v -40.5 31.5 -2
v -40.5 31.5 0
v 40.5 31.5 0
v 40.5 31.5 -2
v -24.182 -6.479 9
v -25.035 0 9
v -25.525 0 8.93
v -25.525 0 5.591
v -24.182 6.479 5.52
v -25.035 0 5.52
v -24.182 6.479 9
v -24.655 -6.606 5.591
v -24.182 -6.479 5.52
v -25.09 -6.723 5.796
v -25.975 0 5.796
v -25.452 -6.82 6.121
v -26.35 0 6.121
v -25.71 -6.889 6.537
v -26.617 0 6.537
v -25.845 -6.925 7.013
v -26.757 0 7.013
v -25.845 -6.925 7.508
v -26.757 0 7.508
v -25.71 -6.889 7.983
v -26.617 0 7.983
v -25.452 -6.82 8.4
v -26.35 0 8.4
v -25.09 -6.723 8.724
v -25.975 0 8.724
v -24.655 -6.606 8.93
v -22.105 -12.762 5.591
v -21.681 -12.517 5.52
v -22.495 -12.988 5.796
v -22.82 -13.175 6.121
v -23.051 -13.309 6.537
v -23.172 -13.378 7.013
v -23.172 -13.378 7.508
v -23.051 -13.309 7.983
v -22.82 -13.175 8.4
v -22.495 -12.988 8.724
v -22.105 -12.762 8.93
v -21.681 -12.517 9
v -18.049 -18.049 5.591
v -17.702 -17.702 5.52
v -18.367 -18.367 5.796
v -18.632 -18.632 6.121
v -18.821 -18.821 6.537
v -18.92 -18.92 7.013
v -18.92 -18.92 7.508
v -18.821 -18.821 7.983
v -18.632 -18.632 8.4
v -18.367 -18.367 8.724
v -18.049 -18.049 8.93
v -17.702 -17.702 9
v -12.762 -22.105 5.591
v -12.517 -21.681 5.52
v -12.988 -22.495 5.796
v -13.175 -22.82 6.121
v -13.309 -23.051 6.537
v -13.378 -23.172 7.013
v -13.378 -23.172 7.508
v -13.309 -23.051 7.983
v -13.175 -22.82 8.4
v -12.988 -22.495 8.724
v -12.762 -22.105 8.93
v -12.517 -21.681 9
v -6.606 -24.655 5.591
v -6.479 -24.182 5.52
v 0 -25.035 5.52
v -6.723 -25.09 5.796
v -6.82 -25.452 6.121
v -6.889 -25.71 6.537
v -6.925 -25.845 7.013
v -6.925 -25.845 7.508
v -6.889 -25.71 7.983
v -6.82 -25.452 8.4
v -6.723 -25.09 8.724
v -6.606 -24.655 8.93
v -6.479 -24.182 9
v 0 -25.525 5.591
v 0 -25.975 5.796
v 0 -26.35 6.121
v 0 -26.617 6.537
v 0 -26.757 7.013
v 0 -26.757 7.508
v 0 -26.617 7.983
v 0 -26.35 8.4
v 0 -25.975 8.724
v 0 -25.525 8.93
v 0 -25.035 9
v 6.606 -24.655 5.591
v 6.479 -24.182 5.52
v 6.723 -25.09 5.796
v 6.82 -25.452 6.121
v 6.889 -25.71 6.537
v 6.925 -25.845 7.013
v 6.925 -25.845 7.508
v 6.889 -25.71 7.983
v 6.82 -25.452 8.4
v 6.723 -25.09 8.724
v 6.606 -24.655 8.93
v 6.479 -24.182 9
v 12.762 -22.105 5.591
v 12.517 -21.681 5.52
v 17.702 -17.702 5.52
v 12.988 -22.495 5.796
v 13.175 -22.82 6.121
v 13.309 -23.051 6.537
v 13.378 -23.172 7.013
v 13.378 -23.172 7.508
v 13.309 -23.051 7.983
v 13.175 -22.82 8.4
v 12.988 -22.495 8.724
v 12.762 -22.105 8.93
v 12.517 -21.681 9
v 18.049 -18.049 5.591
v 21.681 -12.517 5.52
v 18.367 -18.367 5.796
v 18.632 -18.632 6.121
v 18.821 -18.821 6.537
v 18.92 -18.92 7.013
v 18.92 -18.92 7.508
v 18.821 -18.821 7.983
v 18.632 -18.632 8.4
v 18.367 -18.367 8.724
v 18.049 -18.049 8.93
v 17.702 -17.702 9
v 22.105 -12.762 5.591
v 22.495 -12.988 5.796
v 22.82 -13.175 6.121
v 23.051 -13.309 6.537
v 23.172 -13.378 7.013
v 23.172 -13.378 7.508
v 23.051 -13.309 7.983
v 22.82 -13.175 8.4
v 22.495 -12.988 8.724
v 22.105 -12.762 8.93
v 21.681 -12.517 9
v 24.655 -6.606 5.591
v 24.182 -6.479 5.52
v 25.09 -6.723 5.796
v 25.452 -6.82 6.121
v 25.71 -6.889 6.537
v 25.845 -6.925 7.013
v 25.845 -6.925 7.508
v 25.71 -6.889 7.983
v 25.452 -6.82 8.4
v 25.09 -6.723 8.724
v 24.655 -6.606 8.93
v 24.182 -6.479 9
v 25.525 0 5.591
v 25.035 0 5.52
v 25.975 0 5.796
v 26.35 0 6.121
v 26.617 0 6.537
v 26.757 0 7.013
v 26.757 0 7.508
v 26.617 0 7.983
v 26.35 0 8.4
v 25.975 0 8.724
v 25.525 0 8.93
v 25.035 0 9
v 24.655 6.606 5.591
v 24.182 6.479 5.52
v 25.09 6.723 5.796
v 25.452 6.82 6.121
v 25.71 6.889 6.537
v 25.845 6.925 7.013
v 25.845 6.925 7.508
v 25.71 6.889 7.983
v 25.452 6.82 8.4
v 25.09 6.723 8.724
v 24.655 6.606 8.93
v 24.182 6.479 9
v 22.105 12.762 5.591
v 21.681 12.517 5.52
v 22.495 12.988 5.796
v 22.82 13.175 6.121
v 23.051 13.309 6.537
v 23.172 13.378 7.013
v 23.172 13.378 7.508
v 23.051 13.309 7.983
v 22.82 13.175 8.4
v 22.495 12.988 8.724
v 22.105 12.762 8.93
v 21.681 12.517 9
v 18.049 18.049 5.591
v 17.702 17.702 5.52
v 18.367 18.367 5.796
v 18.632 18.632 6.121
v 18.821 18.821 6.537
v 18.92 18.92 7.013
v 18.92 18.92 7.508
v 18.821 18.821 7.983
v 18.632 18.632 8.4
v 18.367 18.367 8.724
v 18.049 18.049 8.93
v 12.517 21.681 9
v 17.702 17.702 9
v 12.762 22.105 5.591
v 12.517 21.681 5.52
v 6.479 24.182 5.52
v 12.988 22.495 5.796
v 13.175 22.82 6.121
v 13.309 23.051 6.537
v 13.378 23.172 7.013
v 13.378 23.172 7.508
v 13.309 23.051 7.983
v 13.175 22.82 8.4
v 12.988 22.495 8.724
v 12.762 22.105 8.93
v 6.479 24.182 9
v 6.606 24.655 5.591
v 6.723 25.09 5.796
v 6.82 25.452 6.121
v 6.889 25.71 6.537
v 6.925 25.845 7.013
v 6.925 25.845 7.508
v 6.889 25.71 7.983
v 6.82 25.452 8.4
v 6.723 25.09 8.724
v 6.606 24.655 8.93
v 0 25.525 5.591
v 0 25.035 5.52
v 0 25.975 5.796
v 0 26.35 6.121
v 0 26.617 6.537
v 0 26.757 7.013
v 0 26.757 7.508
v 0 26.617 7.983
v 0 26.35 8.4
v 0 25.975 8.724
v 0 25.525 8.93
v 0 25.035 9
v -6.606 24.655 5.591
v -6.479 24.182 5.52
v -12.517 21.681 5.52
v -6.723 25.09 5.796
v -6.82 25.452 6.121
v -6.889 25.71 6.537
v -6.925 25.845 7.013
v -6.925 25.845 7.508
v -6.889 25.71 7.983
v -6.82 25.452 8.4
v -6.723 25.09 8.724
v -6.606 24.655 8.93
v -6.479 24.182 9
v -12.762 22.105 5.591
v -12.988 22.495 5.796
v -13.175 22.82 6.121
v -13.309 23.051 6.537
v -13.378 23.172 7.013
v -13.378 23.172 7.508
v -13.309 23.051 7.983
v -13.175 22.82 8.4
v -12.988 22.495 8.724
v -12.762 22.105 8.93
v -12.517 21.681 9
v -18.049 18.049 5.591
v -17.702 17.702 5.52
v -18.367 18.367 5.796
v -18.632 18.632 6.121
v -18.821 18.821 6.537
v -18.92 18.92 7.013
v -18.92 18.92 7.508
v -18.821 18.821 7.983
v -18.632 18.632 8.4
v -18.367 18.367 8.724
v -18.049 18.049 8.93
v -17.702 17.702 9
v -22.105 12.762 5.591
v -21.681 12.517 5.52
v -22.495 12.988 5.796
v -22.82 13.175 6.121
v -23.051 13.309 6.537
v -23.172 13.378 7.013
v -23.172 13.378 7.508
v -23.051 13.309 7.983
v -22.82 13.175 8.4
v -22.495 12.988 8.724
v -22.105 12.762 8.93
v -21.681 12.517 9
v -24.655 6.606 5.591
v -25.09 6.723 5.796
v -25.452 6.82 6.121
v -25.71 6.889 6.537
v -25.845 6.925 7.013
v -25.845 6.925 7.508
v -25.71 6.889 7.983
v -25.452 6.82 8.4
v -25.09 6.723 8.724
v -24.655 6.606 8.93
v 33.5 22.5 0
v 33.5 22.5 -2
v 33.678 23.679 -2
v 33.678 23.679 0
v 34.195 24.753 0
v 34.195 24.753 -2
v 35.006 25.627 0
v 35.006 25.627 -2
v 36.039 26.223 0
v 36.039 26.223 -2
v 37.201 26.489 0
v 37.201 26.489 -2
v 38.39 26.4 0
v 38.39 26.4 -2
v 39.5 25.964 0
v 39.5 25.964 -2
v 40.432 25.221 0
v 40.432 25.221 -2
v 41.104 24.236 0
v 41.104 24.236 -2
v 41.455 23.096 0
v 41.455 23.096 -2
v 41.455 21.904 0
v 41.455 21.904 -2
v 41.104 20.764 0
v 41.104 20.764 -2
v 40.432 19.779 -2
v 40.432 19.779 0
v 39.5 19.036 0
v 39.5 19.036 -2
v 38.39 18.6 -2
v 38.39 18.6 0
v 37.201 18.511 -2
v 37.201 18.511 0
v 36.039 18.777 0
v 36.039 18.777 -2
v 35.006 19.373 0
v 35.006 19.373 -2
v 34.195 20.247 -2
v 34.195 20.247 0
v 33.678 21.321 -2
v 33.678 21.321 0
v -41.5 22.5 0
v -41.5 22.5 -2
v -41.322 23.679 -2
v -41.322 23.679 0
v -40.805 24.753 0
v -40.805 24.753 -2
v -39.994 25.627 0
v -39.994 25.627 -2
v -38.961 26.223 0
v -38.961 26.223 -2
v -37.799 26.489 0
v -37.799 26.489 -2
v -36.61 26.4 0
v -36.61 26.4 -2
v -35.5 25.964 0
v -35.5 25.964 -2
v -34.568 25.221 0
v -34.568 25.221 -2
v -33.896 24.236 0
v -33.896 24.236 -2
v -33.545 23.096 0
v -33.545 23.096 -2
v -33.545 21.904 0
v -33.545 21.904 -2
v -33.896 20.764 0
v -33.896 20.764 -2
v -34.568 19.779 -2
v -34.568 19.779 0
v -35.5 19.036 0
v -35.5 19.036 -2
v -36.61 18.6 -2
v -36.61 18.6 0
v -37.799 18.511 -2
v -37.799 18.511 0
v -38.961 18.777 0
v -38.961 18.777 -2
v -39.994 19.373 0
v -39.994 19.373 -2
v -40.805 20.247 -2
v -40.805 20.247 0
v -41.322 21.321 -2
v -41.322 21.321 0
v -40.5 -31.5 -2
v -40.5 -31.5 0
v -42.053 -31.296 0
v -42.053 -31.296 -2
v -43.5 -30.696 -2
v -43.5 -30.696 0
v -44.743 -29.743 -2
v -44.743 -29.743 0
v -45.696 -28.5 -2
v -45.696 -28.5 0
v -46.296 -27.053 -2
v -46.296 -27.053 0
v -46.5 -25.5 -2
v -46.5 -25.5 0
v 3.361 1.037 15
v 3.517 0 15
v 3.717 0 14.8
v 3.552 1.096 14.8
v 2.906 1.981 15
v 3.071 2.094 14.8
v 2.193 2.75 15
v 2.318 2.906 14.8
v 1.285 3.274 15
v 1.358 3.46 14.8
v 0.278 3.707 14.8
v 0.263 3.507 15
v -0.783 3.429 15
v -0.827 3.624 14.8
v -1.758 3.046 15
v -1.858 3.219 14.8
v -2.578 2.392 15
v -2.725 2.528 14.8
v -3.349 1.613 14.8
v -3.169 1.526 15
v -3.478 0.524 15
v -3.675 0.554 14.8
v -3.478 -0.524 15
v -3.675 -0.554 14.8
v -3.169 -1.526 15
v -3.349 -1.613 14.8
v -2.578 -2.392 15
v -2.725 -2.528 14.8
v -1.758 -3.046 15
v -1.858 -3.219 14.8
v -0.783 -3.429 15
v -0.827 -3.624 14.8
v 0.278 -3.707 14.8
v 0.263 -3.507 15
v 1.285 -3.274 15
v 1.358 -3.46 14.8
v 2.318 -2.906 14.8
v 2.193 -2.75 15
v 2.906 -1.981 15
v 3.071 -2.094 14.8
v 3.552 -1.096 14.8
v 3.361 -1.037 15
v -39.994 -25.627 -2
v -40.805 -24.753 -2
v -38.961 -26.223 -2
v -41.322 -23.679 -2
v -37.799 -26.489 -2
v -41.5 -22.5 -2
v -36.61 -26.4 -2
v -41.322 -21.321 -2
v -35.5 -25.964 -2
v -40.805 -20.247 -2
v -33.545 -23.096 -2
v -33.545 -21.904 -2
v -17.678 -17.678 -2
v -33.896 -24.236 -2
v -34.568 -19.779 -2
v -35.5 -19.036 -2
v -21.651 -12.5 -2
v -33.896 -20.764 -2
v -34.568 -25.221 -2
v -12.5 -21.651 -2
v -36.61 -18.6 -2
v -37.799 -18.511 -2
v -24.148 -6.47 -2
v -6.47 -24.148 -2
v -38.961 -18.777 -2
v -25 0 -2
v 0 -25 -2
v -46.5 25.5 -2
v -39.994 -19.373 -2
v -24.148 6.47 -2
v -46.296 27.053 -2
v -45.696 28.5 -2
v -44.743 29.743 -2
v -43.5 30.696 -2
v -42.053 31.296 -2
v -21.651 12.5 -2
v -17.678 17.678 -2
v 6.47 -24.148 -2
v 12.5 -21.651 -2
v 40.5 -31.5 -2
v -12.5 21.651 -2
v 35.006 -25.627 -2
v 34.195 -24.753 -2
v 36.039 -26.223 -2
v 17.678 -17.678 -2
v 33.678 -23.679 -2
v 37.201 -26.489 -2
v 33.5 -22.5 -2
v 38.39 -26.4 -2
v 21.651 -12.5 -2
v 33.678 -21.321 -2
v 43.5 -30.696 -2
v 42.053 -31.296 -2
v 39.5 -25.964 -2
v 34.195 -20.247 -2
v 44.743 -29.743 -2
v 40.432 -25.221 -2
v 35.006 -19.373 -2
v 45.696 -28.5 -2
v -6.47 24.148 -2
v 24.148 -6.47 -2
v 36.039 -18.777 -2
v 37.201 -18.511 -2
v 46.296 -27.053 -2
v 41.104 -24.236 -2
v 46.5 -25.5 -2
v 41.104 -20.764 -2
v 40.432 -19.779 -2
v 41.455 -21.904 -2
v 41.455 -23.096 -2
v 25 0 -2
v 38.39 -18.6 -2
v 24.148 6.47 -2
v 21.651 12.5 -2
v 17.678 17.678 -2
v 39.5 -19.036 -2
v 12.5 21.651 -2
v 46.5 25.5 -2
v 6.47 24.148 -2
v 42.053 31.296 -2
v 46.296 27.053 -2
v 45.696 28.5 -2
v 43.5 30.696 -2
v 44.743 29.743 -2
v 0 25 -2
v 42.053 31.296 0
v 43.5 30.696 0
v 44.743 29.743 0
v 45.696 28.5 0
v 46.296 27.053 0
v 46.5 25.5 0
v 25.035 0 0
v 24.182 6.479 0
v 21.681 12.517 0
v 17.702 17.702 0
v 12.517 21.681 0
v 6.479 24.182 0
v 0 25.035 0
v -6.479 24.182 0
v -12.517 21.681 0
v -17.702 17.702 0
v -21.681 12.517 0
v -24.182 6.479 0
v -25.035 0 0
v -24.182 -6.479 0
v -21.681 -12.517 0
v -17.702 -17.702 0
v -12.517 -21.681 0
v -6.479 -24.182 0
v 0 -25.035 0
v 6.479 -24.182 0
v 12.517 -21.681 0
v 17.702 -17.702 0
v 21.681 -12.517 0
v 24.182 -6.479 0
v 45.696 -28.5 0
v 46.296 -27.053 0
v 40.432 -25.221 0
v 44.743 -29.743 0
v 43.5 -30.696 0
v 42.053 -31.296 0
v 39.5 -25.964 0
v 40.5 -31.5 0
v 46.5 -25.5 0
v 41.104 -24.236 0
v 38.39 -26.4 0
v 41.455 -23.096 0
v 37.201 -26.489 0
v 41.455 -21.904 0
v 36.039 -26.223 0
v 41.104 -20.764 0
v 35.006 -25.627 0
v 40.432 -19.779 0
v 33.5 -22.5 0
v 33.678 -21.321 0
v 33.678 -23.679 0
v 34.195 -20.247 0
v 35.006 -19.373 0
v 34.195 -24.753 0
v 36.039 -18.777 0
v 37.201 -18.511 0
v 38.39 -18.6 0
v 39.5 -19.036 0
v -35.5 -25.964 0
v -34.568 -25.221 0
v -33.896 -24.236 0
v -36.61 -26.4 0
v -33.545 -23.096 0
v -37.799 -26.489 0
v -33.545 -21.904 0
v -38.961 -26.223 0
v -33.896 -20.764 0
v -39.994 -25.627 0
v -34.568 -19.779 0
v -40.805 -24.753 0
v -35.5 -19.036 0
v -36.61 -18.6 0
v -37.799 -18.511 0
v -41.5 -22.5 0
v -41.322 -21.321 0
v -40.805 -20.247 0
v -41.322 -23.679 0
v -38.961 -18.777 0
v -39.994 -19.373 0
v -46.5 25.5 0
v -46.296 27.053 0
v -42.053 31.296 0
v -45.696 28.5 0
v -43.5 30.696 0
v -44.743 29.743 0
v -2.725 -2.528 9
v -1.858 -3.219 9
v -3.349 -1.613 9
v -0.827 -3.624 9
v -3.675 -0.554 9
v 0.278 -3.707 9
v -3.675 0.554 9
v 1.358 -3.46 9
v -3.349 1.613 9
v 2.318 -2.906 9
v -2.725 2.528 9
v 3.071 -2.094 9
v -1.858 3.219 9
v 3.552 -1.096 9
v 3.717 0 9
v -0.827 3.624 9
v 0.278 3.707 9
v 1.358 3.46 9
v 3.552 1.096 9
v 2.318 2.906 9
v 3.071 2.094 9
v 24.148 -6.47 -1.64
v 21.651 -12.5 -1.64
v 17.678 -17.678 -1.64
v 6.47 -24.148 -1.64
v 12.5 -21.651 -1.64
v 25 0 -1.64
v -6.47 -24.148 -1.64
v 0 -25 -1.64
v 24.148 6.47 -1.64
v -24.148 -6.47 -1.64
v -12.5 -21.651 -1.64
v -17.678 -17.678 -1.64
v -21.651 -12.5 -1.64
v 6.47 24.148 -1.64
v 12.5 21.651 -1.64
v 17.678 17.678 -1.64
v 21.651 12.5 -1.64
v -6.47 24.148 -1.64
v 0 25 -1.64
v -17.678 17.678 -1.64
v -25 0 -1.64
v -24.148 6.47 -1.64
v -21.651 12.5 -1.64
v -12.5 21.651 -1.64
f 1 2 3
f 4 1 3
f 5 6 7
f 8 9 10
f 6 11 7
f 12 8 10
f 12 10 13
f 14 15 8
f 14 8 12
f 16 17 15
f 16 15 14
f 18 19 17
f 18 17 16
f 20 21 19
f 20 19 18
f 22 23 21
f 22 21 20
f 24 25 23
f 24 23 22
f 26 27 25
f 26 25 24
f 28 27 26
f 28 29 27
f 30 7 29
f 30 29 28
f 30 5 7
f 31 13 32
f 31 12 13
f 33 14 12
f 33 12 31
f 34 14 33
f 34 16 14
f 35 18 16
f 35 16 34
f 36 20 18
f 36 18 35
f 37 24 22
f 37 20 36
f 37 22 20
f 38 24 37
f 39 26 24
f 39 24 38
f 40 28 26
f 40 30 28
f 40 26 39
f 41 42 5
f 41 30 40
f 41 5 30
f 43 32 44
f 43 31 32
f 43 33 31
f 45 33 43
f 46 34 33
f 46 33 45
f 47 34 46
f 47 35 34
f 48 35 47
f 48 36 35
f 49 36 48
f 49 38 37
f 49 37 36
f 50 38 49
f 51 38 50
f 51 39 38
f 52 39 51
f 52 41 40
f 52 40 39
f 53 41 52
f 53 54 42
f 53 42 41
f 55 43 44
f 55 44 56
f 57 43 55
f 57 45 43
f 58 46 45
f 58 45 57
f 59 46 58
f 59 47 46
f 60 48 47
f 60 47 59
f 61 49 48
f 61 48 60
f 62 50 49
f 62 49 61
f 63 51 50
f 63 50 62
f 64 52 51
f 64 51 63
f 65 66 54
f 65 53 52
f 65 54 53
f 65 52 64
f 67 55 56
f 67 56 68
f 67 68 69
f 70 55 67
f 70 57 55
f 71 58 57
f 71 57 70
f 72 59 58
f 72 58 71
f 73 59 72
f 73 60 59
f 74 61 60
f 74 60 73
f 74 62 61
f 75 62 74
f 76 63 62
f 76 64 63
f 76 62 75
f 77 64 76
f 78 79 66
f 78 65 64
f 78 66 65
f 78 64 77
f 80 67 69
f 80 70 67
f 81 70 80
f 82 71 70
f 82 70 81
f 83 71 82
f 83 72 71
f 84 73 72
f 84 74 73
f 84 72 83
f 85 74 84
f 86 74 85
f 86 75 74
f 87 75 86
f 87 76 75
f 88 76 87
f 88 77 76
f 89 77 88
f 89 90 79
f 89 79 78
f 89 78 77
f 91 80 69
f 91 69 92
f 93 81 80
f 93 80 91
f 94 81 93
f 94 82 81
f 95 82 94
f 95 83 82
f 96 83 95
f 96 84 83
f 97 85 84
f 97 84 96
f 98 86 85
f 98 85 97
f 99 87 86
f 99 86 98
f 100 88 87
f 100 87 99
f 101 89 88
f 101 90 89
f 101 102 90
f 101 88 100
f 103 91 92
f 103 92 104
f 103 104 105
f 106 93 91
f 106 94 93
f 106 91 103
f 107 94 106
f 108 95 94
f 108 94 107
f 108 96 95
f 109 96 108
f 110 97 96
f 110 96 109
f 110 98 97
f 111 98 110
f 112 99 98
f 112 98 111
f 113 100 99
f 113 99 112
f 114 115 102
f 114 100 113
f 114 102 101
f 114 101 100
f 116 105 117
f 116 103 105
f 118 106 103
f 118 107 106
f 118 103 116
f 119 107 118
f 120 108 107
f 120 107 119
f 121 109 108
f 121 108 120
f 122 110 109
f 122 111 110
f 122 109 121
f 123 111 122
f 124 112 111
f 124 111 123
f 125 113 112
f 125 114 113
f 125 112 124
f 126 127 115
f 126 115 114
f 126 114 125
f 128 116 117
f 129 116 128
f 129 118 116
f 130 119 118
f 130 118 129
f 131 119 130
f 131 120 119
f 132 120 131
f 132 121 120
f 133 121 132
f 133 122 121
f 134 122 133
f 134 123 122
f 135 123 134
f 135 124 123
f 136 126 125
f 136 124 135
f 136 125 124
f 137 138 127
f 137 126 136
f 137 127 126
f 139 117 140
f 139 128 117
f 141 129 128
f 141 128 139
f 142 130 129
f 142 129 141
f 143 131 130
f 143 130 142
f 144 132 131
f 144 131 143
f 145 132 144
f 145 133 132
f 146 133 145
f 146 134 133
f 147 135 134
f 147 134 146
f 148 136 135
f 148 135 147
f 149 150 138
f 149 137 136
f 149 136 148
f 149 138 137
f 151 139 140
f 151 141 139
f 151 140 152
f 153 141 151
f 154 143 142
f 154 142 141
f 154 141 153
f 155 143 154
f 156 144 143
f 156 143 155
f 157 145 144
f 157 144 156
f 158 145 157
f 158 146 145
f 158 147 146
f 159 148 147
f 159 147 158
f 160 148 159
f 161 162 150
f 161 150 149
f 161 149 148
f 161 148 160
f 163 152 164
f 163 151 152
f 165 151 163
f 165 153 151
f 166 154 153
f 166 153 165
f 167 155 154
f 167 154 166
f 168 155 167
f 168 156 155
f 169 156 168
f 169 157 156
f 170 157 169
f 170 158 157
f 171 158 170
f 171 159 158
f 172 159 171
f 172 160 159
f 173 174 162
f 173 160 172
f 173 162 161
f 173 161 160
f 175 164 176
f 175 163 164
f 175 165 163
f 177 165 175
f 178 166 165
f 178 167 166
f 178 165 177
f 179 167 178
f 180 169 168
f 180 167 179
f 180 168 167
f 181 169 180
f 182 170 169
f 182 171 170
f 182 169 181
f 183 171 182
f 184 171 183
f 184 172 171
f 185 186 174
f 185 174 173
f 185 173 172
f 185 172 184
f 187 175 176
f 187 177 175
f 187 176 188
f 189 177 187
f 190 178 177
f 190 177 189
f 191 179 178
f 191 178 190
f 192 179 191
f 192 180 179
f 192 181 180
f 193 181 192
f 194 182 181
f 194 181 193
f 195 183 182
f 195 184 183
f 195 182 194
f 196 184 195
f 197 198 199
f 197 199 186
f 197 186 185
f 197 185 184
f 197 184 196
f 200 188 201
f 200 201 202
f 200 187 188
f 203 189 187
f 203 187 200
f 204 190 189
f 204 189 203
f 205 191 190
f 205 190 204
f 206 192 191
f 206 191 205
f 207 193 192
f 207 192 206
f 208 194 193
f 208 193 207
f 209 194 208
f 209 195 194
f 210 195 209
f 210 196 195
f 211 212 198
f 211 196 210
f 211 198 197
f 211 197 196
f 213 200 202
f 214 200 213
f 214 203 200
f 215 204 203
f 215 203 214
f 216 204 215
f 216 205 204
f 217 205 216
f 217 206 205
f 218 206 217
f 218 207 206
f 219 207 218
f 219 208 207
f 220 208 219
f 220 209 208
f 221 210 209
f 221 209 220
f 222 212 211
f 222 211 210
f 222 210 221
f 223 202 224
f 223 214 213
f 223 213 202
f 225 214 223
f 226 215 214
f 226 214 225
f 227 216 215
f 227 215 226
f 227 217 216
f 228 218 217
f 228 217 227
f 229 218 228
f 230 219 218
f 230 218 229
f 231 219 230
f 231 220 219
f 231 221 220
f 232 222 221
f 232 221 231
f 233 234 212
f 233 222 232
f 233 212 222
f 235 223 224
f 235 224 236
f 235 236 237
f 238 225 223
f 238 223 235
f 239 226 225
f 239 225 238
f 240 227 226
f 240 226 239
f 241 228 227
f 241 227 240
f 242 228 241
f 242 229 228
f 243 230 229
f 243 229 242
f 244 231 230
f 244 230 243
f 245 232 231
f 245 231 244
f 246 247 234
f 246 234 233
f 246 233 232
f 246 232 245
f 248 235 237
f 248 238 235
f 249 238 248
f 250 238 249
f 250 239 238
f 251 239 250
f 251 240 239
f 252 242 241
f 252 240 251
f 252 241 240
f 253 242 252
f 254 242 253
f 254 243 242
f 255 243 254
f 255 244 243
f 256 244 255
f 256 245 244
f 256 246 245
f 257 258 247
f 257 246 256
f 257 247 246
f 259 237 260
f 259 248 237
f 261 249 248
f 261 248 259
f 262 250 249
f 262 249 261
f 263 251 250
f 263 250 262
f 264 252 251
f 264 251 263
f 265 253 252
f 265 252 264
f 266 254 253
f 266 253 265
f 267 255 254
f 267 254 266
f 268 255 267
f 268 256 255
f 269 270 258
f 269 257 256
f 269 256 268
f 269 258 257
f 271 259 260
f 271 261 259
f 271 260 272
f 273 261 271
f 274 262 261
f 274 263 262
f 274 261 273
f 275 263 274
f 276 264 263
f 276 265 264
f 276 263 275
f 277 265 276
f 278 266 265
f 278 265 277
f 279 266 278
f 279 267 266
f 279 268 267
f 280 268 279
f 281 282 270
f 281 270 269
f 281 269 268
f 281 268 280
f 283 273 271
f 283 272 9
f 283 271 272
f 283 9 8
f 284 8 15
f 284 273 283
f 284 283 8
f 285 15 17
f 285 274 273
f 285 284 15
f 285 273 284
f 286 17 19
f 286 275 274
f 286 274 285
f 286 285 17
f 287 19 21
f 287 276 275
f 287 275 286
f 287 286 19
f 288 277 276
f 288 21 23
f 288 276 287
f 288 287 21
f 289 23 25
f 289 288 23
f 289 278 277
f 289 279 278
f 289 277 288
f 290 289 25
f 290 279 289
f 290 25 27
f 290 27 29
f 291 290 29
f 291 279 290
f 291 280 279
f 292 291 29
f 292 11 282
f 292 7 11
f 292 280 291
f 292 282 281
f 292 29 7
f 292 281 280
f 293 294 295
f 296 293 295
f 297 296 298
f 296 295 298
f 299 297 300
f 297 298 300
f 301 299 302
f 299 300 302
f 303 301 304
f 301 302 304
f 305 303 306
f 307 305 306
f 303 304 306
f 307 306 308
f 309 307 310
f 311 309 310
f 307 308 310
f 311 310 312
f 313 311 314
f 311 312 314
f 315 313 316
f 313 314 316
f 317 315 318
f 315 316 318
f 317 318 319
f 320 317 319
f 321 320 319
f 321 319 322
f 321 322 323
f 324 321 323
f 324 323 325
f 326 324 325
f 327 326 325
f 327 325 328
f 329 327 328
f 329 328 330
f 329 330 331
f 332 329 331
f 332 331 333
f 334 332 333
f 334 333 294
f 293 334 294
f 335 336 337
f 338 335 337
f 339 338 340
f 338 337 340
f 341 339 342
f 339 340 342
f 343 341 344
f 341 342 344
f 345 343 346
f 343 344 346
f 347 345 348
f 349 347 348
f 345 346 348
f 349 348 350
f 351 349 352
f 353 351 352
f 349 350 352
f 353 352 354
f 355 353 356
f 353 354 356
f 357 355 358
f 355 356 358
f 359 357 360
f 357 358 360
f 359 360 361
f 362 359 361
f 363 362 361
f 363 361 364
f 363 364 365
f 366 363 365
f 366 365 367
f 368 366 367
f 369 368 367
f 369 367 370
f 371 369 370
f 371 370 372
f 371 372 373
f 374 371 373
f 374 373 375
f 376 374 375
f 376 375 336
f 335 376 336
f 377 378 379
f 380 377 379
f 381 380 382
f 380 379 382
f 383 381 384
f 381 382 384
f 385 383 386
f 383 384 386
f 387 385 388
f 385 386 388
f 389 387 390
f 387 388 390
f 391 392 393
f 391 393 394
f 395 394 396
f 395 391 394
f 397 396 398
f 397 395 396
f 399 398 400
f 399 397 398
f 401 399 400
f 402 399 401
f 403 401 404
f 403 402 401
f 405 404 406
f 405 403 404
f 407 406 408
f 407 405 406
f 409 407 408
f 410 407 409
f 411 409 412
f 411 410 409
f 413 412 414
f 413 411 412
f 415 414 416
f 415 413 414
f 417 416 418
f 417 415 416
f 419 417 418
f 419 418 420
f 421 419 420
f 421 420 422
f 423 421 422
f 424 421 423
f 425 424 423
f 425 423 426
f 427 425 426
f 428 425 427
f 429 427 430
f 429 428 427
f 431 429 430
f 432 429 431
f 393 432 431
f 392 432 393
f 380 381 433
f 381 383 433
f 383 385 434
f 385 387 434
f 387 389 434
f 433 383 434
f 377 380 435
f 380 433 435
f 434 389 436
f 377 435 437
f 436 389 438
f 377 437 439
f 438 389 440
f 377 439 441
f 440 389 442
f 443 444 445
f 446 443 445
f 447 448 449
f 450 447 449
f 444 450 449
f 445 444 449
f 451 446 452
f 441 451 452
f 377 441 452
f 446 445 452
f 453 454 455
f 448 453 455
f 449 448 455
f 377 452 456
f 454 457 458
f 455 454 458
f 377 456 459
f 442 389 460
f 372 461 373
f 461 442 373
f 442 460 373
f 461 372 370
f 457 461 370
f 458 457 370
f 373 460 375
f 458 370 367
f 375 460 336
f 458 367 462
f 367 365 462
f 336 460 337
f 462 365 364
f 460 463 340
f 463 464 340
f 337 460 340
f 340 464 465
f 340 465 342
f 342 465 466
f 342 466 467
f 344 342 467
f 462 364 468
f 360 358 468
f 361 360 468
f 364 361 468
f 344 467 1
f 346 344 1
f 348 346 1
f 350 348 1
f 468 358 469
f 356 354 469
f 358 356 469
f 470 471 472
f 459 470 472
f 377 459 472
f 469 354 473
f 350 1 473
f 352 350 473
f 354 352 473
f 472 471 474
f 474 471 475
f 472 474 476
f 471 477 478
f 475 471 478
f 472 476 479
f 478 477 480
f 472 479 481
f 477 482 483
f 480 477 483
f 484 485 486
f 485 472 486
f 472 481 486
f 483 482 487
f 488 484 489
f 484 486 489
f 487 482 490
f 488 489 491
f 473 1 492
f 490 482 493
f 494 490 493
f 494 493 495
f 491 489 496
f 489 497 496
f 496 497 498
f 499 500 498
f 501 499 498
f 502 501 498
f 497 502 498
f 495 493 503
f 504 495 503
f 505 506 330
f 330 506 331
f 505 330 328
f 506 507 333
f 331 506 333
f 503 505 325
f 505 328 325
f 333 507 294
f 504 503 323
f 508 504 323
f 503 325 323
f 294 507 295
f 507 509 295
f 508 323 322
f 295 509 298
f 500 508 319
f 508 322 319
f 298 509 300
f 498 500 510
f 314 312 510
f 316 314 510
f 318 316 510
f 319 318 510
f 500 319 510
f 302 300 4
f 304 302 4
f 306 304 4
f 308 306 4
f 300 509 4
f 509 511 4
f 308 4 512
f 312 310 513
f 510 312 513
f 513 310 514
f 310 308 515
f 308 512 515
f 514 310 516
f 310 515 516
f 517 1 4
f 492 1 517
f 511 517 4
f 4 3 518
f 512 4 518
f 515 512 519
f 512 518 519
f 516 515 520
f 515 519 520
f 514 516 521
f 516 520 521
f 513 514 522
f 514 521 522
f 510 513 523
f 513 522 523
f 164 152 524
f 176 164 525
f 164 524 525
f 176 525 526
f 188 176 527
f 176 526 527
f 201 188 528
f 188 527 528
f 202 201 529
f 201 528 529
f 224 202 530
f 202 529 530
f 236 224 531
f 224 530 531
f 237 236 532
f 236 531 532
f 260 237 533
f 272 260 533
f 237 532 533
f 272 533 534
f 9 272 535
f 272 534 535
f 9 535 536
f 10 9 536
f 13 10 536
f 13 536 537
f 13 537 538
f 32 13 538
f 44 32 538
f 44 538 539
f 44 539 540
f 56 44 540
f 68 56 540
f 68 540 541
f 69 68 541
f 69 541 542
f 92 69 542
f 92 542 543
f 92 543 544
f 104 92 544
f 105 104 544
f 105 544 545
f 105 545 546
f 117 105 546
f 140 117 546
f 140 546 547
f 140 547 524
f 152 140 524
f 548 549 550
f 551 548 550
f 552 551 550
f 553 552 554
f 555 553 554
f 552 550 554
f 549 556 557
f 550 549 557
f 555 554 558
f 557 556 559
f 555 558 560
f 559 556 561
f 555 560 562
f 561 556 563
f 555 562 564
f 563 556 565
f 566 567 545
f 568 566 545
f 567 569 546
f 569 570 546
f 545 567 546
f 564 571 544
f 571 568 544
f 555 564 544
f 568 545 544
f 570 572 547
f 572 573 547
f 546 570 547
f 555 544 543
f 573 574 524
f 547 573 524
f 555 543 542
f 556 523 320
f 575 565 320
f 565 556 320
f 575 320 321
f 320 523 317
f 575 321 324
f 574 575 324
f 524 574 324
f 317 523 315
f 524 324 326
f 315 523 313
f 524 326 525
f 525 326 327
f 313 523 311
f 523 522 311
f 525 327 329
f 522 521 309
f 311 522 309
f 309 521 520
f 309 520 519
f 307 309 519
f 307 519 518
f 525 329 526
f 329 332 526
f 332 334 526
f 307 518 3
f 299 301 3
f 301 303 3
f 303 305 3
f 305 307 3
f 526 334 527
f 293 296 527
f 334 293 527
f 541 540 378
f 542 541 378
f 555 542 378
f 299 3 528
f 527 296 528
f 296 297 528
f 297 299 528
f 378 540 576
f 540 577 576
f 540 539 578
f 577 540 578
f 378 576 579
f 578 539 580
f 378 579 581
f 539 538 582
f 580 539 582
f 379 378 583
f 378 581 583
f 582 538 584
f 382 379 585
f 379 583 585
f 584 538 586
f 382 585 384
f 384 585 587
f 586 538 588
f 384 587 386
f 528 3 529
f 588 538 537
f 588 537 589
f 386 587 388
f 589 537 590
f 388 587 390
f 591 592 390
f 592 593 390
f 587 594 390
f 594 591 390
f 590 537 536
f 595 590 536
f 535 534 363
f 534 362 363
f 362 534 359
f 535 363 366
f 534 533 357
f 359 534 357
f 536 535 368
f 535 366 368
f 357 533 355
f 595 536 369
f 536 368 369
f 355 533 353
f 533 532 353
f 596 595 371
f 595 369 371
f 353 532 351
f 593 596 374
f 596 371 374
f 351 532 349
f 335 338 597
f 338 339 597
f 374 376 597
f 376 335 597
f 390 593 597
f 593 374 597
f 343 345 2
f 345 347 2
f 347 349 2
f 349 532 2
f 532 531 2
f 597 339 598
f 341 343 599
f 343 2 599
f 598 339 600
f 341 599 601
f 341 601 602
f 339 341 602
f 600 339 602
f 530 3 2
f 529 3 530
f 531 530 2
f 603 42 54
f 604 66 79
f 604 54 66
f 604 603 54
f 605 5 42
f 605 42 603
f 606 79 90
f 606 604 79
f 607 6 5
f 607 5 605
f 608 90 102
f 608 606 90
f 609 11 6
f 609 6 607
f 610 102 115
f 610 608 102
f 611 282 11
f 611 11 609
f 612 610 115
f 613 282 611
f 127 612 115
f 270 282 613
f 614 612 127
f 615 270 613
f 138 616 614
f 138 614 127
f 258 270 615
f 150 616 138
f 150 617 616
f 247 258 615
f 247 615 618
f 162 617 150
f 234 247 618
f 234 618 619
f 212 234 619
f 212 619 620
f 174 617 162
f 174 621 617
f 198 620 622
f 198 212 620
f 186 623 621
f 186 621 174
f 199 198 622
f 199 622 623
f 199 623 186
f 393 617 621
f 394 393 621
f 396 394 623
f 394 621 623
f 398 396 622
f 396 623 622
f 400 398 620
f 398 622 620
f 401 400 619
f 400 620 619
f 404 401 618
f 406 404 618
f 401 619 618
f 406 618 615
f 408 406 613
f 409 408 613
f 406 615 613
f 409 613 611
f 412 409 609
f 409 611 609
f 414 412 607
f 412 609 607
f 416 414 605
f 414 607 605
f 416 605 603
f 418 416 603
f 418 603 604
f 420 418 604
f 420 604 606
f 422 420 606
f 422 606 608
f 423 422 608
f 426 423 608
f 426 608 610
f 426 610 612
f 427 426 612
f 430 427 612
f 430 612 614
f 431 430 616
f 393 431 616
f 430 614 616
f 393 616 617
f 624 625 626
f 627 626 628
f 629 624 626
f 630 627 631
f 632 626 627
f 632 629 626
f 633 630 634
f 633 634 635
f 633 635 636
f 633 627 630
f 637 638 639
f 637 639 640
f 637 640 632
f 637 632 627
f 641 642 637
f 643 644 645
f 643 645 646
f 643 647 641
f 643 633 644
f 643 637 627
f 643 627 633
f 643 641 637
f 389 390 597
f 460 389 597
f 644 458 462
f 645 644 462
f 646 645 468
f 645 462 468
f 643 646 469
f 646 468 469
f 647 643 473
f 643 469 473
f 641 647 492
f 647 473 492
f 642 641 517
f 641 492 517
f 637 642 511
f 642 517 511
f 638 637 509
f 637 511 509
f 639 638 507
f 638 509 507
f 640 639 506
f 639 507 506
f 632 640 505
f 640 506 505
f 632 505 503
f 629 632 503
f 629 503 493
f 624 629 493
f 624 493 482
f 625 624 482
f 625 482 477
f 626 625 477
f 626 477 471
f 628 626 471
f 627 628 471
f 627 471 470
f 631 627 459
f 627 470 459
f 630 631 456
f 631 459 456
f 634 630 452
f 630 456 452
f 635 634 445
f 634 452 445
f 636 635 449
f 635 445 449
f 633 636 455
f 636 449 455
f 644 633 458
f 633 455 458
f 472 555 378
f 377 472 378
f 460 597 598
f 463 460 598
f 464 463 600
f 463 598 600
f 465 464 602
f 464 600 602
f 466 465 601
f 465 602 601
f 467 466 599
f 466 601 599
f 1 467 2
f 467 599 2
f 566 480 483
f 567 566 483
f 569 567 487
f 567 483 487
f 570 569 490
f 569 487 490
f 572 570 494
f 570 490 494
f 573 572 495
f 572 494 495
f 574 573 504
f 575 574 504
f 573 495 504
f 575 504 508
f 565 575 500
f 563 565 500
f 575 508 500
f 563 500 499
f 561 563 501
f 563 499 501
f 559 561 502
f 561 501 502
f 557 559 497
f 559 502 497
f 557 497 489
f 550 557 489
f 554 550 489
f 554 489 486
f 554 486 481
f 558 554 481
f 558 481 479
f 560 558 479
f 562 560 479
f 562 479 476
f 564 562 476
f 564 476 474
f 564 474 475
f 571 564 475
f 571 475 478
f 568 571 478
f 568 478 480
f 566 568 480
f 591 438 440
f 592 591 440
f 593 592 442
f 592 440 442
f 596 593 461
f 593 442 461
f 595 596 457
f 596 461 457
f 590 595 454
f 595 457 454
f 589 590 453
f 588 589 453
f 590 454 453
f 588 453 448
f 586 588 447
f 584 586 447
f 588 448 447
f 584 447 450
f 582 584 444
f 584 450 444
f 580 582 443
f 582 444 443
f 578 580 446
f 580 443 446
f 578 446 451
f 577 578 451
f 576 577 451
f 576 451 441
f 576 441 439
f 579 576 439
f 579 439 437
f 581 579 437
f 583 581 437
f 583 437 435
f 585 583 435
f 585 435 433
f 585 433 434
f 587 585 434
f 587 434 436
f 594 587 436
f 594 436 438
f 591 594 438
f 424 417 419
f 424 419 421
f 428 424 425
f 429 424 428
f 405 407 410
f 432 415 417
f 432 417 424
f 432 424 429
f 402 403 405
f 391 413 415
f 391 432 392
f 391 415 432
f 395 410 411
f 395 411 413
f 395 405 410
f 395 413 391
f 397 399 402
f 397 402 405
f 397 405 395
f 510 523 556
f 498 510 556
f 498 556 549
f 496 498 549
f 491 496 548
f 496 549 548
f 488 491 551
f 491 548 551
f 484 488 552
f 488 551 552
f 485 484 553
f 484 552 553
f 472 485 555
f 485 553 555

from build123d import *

# Parameters (mm, degrees)
EXTRUDE_1_DEPTH     = 2
SKETCH_4_R          = 25.034791669
EXTRUDE_2_DEPTH     = 9
SKETCH_5_R          = 1.739871364
SKETCH_7_R          = 3.716982855
EXTRUDE_3_DEPTH     = 6
CHAMFER_1_SIZE      = 0.2
SKETCH_9_R          = 25
CUT_EXTRUDE_2_DEPTH = 0.36
EXTRUDE_4_DEPTH     = 2
SKETCH_13_R         = 4
CUT_EXTRUDE_3_DEPTH = 35


with BuildPart() as part:
    # 草图1 → 凸台-拉伸1 (new body)
    with BuildSketch(Plane.XY):
        with BuildLine():
            Line((40.5, -31.5), (-40.5, -31.5))
            ThreePointArc((-40.5, -31.5), (-44.742640687, -29.742640687), (-46.5, -25.5))
            Line((-46.5, -25.5), (-46.5, 25.5))
            ThreePointArc((-46.5, 25.5), (-44.742640687, 29.742640687), (-40.5, 31.5))
            Line((-40.5, 31.5), (40.5, 31.5))
            ThreePointArc((40.5, 31.5), (44.742640687, 29.742640687), (46.5, 25.5))
            Line((46.5, 25.5), (46.5, -25.5))
            ThreePointArc((46.5, -25.5), (44.742640687, -29.742640687), (40.5, -31.5))
        make_face()
        with BuildLine():
            Line((-43.156854249, 22.5), (-37.5, 28.156854249))
            ThreePointArc((-37.5, 28.156854249), (-31.843145751, 28.156854249), (-31.843145751, 22.5))
            Line((-31.843145751, 22.5), (-37.5, 16.843145751))
            ThreePointArc((-37.5, 16.843145751), (-43.156854249, 16.843145751), (-43.156854249, 22.5))
        make_face(mode=Mode.SUBTRACT)
        with BuildLine():
            Line((37.5, 28.156854249), (43.156854249, 22.5))
            ThreePointArc((43.156854249, 22.5), (43.156854249, 16.843145751), (37.5, 16.843145751))
            Line((37.5, 16.843145751), (31.843145751, 22.5))
            ThreePointArc((31.843145751, 22.5), (31.843145751, 28.156854249), (37.5, 28.156854249))
        make_face(mode=Mode.SUBTRACT)
        with BuildLine():
            Line((31.843145751, -22.5), (37.5, -16.843145751))
            ThreePointArc((37.5, -16.843145751), (43.156854249, -16.843145751), (43.156854249, -22.5))
            Line((43.156854249, -22.5), (37.5, -28.156854249))
            ThreePointArc((37.5, -28.156854249), (31.843145751, -28.156854249), (31.843145751, -22.5))
        make_face(mode=Mode.SUBTRACT)
        with BuildLine():
            Line((-37.5, -28.156854249), (-43.156854249, -22.5))
            ThreePointArc((-43.156854249, -22.5), (-43.156854249, -16.843145751), (-37.5, -16.843145751))
            Line((-37.5, -16.843145751), (-31.843145751, -22.5))
            ThreePointArc((-31.843145751, -22.5), (-31.843145751, -28.156854249), (-37.5, -28.156854249))
        make_face(mode=Mode.SUBTRACT)
    extrude(amount=-EXTRUDE_1_DEPTH)

    # 草图4 → 凸台-拉伸2 (add)
    with BuildSketch(Plane.XY):
        Circle(SKETCH_4_R)
    extrude(amount=EXTRUDE_2_DEPTH)

    # 草图5 → 旋转2 (revolve)
    with BuildSketch(Plane(origin=(0, 0, 0), x_dir=(1, 0, 0), z_dir=(0, 1, 0))):
        with Locations((-25.034791669, -7.260128636)):
            Circle(SKETCH_5_R)
    revolve(axis=Axis((0, 0, 0), (0, 0, 1)))

    # 草图7 → 凸台-拉伸3 (add)
    with BuildSketch(Plane.XY.offset(9)):
        Circle(SKETCH_7_R)
    extrude(amount=EXTRUDE_3_DEPTH)

    # 倒角1
    chamfer_1_edges = [part.edges().sort_by_distance(p)[0] for p in [
        (-3.716982855, 0, 15),
    ]]
    chamfer(chamfer_1_edges, length=CHAMFER_1_SIZE)

    # 草图9 → 切除-拉伸2 (cut)
    with BuildSketch(Plane(origin=(0, 0, -2), x_dir=(-1, 0, 0), z_dir=(0, 0, -1))):
        Circle(SKETCH_9_R)
    extrude(amount=-CUT_EXTRUDE_2_DEPTH, mode=Mode.SUBTRACT)

    # 草图12 → 凸台-拉伸4 (add)
    with BuildSketch(Plane(origin=(0, 0, -2), x_dir=(-1, 0, 0), z_dir=(0, 0, -1))):
        with BuildLine():
            Line((37.5, 28.156854249), (43.156854249, 22.5))
            ThreePointArc((43.156854249, 22.5), (43.156854249, 16.843145751), (37.5, 16.843145751))
            Line((37.5, 16.843145751), (31.843145751, 22.5))
            ThreePointArc((31.843145751, 22.5), (31.843145751, 28.156854249), (37.5, 28.156854249))
        make_face()
        with BuildLine():
            Line((43.156854249, -22.5), (37.5, -28.156854249))
            ThreePointArc((37.5, -28.156854249), (31.843145751, -28.156854249), (31.843145751, -22.5))
            Line((31.843145751, -22.5), (37.5, -16.843145751))
            ThreePointArc((37.5, -16.843145751), (43.156854249, -16.843145751), (43.156854249, -22.5))
        make_face()
        with BuildLine():
            Line((-37.5, -28.156854249), (-43.156854249, -22.5))
            ThreePointArc((-43.156854249, -22.5), (-43.156854249, -16.843145751), (-37.5, -16.843145751))
            Line((-37.5, -16.843145751), (-31.843145751, -22.5))
            ThreePointArc((-31.843145751, -22.5), (-31.843145751, -28.156854249), (-37.5, -28.156854249))
        make_face()
        with BuildLine():
            Line((-43.156854249, 22.5), (-37.5, 28.156854249))
            ThreePointArc((-37.5, 28.156854249), (-31.843145751, 28.156854249), (-31.843145751, 22.5))
            Line((-31.843145751, 22.5), (-37.5, 16.843145751))
            ThreePointArc((-37.5, 16.843145751), (-43.156854249, 16.843145751), (-43.156854249, 22.5))
        make_face()
    extrude(amount=-EXTRUDE_4_DEPTH)

    # 草图13 → 切除-拉伸3 (cut)
    with BuildSketch(Plane(origin=(0, 0, -2), x_dir=(-1, 0, 0), z_dir=(0, 0, -1))):
        with Locations((-37.5, 22.5)):
            Circle(SKETCH_13_R)
        with Locations((-37.5, -22.5)):
            Circle(SKETCH_13_R)
        with Locations((37.5, -22.5)):
            Circle(SKETCH_13_R)
        with Locations((37.5, 22.5)):
            Circle(SKETCH_13_R)
    extrude(amount=-CUT_EXTRUDE_3_DEPTH, mode=Mode.SUBTRACT)


solid = part.part
